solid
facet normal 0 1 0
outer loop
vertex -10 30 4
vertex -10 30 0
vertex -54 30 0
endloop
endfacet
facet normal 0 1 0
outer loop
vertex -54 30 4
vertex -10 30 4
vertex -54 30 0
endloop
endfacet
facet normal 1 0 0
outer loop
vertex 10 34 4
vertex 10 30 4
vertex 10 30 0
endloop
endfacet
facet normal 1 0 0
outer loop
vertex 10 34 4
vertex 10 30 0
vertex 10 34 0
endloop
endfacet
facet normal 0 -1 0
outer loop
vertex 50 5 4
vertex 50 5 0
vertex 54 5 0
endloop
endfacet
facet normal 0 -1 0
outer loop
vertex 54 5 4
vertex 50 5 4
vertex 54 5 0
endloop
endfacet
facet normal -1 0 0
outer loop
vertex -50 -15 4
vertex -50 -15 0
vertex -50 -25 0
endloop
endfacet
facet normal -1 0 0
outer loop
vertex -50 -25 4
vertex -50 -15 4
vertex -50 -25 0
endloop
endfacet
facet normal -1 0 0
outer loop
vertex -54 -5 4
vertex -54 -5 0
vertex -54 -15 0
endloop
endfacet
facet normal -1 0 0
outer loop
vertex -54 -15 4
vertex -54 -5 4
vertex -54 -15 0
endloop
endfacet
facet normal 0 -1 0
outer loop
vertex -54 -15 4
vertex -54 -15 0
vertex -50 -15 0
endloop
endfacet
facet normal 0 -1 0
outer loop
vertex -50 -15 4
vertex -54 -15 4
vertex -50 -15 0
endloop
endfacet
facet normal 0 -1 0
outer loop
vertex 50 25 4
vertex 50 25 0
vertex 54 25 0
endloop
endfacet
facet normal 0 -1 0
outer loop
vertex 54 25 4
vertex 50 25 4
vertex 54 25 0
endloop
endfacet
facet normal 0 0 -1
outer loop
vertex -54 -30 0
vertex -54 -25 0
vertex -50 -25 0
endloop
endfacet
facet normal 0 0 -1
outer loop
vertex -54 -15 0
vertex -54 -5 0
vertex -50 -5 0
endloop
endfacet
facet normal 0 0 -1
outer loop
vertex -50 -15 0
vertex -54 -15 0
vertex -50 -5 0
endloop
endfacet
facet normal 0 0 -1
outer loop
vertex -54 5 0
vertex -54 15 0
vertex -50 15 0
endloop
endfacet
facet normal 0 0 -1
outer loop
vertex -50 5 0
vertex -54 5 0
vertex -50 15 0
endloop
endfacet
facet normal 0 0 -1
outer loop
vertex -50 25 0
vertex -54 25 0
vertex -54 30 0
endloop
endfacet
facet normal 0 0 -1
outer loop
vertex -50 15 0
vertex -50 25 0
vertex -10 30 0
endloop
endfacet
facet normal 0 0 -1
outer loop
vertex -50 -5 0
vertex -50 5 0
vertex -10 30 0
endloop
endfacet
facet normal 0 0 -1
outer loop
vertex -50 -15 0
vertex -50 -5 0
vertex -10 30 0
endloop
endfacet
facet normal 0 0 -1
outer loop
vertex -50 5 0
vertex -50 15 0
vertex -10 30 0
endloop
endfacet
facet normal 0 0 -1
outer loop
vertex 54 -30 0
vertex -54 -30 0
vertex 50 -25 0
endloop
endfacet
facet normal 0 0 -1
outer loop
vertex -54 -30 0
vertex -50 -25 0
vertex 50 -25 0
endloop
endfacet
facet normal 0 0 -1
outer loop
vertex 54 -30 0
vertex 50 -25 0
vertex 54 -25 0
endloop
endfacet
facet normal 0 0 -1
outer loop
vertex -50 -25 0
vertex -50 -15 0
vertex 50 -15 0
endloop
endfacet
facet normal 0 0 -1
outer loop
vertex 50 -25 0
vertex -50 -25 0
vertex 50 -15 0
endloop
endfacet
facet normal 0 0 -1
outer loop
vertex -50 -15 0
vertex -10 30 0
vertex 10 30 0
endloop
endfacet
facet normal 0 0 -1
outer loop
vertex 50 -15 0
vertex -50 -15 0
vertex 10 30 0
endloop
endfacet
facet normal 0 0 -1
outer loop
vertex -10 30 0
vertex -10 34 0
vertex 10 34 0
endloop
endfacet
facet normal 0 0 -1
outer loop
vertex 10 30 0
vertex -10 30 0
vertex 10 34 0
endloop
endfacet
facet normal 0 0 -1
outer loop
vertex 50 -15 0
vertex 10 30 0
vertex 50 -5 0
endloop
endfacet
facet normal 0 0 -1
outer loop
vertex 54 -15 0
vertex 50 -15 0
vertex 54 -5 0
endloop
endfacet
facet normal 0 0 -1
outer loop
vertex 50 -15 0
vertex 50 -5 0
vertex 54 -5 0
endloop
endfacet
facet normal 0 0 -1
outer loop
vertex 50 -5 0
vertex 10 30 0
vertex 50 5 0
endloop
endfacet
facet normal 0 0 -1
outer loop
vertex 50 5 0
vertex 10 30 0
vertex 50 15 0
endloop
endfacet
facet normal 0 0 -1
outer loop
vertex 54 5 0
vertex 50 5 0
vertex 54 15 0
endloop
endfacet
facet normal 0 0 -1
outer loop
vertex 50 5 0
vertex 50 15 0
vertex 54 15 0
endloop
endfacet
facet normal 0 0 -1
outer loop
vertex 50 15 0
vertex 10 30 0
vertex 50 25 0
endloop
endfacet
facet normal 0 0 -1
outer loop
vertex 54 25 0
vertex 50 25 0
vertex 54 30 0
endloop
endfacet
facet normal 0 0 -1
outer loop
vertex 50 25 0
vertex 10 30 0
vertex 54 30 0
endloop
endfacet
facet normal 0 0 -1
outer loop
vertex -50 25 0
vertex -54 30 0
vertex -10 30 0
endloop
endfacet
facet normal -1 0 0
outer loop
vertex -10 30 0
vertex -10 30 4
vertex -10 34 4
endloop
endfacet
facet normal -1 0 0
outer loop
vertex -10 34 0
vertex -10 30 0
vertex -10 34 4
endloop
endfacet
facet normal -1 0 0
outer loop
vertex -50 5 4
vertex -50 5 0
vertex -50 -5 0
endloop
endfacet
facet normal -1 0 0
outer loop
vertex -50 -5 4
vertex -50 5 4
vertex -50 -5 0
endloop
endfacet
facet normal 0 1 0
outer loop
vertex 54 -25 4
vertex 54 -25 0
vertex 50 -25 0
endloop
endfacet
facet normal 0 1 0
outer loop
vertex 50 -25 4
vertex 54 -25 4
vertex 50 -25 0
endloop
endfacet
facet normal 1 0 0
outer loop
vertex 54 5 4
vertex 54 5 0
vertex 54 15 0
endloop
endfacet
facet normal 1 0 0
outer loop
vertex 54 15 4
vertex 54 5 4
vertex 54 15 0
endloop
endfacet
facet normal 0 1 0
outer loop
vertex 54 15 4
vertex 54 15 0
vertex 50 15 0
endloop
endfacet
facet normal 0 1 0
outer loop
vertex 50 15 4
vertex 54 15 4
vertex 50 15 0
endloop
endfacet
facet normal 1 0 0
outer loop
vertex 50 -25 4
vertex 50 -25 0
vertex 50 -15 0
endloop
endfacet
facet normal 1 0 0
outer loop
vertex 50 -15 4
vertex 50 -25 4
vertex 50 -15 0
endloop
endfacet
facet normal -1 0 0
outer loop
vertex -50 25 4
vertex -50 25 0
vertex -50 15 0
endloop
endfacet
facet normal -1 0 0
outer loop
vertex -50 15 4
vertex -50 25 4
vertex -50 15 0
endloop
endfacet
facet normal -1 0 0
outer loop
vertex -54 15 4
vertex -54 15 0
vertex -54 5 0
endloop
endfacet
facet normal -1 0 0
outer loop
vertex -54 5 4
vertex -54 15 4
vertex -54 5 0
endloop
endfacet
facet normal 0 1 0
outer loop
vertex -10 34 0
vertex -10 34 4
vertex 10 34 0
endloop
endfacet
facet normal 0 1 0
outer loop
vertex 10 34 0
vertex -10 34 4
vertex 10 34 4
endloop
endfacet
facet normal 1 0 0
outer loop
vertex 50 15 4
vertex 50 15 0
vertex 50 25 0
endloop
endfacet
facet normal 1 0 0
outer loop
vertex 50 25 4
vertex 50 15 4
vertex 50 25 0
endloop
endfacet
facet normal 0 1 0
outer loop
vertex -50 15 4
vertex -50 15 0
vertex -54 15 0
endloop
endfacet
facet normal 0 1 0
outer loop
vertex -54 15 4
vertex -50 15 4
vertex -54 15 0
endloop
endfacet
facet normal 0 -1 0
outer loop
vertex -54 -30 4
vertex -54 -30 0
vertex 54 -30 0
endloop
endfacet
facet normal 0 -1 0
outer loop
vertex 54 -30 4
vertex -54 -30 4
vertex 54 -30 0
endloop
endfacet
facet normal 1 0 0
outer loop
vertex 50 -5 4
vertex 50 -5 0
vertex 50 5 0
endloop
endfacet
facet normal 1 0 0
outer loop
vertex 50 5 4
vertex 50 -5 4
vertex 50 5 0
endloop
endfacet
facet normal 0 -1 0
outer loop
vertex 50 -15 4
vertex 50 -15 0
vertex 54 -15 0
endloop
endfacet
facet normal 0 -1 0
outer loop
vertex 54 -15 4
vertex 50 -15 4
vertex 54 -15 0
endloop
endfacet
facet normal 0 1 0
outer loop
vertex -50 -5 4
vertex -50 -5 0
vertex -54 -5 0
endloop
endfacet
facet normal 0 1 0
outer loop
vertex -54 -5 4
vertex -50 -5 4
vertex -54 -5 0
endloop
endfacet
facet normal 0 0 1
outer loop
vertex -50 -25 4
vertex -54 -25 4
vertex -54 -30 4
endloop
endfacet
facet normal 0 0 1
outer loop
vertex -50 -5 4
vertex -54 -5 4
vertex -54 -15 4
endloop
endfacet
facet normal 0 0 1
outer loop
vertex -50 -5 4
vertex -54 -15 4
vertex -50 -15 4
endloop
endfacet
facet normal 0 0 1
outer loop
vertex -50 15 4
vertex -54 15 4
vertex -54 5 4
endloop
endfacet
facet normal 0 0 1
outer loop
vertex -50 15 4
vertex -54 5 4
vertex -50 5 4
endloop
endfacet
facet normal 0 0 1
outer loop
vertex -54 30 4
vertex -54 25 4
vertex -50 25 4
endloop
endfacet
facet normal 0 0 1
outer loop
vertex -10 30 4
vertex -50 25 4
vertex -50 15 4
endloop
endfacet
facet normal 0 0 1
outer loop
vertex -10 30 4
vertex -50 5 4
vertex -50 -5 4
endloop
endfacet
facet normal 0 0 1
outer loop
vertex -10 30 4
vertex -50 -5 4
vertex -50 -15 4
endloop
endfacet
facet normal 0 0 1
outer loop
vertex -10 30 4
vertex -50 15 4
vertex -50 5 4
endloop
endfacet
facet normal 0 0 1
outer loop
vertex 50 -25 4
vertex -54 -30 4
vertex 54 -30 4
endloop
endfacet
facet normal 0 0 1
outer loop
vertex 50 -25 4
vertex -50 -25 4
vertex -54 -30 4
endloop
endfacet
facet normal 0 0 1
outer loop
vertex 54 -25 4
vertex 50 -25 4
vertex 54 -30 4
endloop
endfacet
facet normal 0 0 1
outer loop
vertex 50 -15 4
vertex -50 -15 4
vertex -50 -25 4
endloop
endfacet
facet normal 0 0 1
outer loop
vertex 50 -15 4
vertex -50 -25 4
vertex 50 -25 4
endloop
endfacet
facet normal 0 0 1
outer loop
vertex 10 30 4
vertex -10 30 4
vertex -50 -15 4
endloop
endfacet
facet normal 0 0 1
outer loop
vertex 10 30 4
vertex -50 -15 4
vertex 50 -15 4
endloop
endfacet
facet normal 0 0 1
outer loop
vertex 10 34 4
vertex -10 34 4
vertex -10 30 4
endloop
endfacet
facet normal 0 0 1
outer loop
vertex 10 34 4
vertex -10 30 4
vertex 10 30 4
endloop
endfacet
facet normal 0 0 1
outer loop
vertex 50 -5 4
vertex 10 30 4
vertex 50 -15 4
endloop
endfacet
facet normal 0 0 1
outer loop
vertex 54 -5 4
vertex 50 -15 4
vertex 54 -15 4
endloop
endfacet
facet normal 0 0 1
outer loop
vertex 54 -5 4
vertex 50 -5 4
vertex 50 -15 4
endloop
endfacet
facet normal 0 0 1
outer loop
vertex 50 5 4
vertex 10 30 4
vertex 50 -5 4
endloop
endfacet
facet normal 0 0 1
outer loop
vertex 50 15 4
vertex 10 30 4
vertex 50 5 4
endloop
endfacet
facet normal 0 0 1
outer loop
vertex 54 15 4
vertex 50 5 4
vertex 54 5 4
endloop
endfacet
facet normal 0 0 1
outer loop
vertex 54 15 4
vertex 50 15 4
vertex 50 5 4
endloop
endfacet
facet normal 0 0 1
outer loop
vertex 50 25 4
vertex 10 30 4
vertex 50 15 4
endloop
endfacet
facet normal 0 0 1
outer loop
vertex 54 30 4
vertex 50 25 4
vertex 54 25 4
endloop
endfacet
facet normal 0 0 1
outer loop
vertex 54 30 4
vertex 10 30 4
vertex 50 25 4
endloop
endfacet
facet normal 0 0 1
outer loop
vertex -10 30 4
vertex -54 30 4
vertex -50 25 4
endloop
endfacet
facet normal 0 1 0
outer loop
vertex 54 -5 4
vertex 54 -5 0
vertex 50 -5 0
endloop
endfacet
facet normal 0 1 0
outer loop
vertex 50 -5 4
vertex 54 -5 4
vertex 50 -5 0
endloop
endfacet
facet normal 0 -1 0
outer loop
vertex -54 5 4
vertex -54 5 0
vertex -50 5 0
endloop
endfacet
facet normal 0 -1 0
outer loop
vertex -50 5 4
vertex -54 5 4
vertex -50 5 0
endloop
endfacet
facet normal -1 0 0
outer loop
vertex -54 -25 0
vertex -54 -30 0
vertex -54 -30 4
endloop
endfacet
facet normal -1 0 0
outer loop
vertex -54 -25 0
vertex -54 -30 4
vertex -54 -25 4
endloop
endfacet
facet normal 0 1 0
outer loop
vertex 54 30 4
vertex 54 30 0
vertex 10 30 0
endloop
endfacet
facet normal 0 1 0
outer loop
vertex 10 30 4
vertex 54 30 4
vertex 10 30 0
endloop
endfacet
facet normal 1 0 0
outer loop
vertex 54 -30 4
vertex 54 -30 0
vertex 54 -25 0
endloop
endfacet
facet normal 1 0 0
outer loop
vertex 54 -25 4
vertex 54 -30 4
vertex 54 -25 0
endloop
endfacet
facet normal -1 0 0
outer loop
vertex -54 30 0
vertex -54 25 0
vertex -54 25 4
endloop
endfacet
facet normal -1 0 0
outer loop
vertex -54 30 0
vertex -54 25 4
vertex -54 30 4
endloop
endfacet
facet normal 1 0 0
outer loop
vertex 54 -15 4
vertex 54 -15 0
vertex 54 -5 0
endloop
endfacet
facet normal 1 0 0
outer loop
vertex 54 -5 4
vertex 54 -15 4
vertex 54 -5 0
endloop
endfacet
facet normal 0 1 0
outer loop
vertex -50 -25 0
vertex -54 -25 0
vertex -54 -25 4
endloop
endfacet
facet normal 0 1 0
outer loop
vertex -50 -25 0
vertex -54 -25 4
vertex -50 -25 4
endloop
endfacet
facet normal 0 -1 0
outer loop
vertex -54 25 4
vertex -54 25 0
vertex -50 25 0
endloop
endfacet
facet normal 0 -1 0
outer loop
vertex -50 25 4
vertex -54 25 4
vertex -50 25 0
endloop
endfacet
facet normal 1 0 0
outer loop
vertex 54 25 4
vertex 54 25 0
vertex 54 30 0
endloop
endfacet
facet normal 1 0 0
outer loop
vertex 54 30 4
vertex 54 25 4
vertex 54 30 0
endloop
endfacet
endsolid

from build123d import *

# Parameters (mm, degrees)
SKETCH1_W           = 4
SKETCH1_H           = 5
BOSS_EXTRUDE1_DEPTH = 4
SKETCH2_W           = 20
SKETCH2_H           = 4
BOSS_EXTRUDE2_DEPTH = 4


with BuildPart() as part:
    # Sketch1 → Boss-Extrude1 (new body)
    with BuildSketch(Plane.XY):
        Polygon((-40, 30), (-50, 30), (-50, 25), (-50, 20), (-50, 15), (-50, 10), (-50, 5), (-50, -5), (-50, -10), (-50, -15), (-50, -20), (-50, -25), (-50, -30), (50, -30), (50, -25.221238938), (50, -25), (50, -20), (50, -15), (50, -10), (50, -5), (50, 0), (50, 5), (50, 6.10619469), (50, 10), (50, 15), (50, 20), (50, 25), (50, 30), (40, 30), (30, 30), (20, 30), (10, 30), (0, 30), (-10, 30), (-20, 30), (-30, 30), align=None)
        Polygon((-50, 10), (-50, 15), (-54, 15), (-54, 5), (-50, 5), align=None)
        with Locations((-52, 27.5)):
            Rectangle(SKETCH1_W, SKETCH1_H)
        Polygon((-50, -10), (-50, -5), (-54, -5), (-54, -15), (-50, -15), align=None)
        with Locations((-52, -27.5)):
            Rectangle(SKETCH1_W, SKETCH1_H)
        Polygon((54, 15), (50, 15), (50, 10), (50, 6.10619469), (50, 5), (54, 5), align=None)
        with Locations((52, 27.5)):
            Rectangle(SKETCH1_W, SKETCH1_H)
        Polygon((50, -10), (50, -15), (54, -15), (54, -5), (50, -5), align=None)
        Polygon((50, -25.221238938), (50, -30), (54, -30), (54, -25), (50, -25), align=None)
    extrude(amount=BOSS_EXTRUDE1_DEPTH)

    # Sketch2 → Boss-Extrude2 (add)
    with BuildSketch(Plane.XY.offset(4)):
        with Locations((0, 32)):
            Rectangle(SKETCH2_W, SKETCH2_H)
    extrude(amount=-BOSS_EXTRUDE2_DEPTH)


solid = part.part
